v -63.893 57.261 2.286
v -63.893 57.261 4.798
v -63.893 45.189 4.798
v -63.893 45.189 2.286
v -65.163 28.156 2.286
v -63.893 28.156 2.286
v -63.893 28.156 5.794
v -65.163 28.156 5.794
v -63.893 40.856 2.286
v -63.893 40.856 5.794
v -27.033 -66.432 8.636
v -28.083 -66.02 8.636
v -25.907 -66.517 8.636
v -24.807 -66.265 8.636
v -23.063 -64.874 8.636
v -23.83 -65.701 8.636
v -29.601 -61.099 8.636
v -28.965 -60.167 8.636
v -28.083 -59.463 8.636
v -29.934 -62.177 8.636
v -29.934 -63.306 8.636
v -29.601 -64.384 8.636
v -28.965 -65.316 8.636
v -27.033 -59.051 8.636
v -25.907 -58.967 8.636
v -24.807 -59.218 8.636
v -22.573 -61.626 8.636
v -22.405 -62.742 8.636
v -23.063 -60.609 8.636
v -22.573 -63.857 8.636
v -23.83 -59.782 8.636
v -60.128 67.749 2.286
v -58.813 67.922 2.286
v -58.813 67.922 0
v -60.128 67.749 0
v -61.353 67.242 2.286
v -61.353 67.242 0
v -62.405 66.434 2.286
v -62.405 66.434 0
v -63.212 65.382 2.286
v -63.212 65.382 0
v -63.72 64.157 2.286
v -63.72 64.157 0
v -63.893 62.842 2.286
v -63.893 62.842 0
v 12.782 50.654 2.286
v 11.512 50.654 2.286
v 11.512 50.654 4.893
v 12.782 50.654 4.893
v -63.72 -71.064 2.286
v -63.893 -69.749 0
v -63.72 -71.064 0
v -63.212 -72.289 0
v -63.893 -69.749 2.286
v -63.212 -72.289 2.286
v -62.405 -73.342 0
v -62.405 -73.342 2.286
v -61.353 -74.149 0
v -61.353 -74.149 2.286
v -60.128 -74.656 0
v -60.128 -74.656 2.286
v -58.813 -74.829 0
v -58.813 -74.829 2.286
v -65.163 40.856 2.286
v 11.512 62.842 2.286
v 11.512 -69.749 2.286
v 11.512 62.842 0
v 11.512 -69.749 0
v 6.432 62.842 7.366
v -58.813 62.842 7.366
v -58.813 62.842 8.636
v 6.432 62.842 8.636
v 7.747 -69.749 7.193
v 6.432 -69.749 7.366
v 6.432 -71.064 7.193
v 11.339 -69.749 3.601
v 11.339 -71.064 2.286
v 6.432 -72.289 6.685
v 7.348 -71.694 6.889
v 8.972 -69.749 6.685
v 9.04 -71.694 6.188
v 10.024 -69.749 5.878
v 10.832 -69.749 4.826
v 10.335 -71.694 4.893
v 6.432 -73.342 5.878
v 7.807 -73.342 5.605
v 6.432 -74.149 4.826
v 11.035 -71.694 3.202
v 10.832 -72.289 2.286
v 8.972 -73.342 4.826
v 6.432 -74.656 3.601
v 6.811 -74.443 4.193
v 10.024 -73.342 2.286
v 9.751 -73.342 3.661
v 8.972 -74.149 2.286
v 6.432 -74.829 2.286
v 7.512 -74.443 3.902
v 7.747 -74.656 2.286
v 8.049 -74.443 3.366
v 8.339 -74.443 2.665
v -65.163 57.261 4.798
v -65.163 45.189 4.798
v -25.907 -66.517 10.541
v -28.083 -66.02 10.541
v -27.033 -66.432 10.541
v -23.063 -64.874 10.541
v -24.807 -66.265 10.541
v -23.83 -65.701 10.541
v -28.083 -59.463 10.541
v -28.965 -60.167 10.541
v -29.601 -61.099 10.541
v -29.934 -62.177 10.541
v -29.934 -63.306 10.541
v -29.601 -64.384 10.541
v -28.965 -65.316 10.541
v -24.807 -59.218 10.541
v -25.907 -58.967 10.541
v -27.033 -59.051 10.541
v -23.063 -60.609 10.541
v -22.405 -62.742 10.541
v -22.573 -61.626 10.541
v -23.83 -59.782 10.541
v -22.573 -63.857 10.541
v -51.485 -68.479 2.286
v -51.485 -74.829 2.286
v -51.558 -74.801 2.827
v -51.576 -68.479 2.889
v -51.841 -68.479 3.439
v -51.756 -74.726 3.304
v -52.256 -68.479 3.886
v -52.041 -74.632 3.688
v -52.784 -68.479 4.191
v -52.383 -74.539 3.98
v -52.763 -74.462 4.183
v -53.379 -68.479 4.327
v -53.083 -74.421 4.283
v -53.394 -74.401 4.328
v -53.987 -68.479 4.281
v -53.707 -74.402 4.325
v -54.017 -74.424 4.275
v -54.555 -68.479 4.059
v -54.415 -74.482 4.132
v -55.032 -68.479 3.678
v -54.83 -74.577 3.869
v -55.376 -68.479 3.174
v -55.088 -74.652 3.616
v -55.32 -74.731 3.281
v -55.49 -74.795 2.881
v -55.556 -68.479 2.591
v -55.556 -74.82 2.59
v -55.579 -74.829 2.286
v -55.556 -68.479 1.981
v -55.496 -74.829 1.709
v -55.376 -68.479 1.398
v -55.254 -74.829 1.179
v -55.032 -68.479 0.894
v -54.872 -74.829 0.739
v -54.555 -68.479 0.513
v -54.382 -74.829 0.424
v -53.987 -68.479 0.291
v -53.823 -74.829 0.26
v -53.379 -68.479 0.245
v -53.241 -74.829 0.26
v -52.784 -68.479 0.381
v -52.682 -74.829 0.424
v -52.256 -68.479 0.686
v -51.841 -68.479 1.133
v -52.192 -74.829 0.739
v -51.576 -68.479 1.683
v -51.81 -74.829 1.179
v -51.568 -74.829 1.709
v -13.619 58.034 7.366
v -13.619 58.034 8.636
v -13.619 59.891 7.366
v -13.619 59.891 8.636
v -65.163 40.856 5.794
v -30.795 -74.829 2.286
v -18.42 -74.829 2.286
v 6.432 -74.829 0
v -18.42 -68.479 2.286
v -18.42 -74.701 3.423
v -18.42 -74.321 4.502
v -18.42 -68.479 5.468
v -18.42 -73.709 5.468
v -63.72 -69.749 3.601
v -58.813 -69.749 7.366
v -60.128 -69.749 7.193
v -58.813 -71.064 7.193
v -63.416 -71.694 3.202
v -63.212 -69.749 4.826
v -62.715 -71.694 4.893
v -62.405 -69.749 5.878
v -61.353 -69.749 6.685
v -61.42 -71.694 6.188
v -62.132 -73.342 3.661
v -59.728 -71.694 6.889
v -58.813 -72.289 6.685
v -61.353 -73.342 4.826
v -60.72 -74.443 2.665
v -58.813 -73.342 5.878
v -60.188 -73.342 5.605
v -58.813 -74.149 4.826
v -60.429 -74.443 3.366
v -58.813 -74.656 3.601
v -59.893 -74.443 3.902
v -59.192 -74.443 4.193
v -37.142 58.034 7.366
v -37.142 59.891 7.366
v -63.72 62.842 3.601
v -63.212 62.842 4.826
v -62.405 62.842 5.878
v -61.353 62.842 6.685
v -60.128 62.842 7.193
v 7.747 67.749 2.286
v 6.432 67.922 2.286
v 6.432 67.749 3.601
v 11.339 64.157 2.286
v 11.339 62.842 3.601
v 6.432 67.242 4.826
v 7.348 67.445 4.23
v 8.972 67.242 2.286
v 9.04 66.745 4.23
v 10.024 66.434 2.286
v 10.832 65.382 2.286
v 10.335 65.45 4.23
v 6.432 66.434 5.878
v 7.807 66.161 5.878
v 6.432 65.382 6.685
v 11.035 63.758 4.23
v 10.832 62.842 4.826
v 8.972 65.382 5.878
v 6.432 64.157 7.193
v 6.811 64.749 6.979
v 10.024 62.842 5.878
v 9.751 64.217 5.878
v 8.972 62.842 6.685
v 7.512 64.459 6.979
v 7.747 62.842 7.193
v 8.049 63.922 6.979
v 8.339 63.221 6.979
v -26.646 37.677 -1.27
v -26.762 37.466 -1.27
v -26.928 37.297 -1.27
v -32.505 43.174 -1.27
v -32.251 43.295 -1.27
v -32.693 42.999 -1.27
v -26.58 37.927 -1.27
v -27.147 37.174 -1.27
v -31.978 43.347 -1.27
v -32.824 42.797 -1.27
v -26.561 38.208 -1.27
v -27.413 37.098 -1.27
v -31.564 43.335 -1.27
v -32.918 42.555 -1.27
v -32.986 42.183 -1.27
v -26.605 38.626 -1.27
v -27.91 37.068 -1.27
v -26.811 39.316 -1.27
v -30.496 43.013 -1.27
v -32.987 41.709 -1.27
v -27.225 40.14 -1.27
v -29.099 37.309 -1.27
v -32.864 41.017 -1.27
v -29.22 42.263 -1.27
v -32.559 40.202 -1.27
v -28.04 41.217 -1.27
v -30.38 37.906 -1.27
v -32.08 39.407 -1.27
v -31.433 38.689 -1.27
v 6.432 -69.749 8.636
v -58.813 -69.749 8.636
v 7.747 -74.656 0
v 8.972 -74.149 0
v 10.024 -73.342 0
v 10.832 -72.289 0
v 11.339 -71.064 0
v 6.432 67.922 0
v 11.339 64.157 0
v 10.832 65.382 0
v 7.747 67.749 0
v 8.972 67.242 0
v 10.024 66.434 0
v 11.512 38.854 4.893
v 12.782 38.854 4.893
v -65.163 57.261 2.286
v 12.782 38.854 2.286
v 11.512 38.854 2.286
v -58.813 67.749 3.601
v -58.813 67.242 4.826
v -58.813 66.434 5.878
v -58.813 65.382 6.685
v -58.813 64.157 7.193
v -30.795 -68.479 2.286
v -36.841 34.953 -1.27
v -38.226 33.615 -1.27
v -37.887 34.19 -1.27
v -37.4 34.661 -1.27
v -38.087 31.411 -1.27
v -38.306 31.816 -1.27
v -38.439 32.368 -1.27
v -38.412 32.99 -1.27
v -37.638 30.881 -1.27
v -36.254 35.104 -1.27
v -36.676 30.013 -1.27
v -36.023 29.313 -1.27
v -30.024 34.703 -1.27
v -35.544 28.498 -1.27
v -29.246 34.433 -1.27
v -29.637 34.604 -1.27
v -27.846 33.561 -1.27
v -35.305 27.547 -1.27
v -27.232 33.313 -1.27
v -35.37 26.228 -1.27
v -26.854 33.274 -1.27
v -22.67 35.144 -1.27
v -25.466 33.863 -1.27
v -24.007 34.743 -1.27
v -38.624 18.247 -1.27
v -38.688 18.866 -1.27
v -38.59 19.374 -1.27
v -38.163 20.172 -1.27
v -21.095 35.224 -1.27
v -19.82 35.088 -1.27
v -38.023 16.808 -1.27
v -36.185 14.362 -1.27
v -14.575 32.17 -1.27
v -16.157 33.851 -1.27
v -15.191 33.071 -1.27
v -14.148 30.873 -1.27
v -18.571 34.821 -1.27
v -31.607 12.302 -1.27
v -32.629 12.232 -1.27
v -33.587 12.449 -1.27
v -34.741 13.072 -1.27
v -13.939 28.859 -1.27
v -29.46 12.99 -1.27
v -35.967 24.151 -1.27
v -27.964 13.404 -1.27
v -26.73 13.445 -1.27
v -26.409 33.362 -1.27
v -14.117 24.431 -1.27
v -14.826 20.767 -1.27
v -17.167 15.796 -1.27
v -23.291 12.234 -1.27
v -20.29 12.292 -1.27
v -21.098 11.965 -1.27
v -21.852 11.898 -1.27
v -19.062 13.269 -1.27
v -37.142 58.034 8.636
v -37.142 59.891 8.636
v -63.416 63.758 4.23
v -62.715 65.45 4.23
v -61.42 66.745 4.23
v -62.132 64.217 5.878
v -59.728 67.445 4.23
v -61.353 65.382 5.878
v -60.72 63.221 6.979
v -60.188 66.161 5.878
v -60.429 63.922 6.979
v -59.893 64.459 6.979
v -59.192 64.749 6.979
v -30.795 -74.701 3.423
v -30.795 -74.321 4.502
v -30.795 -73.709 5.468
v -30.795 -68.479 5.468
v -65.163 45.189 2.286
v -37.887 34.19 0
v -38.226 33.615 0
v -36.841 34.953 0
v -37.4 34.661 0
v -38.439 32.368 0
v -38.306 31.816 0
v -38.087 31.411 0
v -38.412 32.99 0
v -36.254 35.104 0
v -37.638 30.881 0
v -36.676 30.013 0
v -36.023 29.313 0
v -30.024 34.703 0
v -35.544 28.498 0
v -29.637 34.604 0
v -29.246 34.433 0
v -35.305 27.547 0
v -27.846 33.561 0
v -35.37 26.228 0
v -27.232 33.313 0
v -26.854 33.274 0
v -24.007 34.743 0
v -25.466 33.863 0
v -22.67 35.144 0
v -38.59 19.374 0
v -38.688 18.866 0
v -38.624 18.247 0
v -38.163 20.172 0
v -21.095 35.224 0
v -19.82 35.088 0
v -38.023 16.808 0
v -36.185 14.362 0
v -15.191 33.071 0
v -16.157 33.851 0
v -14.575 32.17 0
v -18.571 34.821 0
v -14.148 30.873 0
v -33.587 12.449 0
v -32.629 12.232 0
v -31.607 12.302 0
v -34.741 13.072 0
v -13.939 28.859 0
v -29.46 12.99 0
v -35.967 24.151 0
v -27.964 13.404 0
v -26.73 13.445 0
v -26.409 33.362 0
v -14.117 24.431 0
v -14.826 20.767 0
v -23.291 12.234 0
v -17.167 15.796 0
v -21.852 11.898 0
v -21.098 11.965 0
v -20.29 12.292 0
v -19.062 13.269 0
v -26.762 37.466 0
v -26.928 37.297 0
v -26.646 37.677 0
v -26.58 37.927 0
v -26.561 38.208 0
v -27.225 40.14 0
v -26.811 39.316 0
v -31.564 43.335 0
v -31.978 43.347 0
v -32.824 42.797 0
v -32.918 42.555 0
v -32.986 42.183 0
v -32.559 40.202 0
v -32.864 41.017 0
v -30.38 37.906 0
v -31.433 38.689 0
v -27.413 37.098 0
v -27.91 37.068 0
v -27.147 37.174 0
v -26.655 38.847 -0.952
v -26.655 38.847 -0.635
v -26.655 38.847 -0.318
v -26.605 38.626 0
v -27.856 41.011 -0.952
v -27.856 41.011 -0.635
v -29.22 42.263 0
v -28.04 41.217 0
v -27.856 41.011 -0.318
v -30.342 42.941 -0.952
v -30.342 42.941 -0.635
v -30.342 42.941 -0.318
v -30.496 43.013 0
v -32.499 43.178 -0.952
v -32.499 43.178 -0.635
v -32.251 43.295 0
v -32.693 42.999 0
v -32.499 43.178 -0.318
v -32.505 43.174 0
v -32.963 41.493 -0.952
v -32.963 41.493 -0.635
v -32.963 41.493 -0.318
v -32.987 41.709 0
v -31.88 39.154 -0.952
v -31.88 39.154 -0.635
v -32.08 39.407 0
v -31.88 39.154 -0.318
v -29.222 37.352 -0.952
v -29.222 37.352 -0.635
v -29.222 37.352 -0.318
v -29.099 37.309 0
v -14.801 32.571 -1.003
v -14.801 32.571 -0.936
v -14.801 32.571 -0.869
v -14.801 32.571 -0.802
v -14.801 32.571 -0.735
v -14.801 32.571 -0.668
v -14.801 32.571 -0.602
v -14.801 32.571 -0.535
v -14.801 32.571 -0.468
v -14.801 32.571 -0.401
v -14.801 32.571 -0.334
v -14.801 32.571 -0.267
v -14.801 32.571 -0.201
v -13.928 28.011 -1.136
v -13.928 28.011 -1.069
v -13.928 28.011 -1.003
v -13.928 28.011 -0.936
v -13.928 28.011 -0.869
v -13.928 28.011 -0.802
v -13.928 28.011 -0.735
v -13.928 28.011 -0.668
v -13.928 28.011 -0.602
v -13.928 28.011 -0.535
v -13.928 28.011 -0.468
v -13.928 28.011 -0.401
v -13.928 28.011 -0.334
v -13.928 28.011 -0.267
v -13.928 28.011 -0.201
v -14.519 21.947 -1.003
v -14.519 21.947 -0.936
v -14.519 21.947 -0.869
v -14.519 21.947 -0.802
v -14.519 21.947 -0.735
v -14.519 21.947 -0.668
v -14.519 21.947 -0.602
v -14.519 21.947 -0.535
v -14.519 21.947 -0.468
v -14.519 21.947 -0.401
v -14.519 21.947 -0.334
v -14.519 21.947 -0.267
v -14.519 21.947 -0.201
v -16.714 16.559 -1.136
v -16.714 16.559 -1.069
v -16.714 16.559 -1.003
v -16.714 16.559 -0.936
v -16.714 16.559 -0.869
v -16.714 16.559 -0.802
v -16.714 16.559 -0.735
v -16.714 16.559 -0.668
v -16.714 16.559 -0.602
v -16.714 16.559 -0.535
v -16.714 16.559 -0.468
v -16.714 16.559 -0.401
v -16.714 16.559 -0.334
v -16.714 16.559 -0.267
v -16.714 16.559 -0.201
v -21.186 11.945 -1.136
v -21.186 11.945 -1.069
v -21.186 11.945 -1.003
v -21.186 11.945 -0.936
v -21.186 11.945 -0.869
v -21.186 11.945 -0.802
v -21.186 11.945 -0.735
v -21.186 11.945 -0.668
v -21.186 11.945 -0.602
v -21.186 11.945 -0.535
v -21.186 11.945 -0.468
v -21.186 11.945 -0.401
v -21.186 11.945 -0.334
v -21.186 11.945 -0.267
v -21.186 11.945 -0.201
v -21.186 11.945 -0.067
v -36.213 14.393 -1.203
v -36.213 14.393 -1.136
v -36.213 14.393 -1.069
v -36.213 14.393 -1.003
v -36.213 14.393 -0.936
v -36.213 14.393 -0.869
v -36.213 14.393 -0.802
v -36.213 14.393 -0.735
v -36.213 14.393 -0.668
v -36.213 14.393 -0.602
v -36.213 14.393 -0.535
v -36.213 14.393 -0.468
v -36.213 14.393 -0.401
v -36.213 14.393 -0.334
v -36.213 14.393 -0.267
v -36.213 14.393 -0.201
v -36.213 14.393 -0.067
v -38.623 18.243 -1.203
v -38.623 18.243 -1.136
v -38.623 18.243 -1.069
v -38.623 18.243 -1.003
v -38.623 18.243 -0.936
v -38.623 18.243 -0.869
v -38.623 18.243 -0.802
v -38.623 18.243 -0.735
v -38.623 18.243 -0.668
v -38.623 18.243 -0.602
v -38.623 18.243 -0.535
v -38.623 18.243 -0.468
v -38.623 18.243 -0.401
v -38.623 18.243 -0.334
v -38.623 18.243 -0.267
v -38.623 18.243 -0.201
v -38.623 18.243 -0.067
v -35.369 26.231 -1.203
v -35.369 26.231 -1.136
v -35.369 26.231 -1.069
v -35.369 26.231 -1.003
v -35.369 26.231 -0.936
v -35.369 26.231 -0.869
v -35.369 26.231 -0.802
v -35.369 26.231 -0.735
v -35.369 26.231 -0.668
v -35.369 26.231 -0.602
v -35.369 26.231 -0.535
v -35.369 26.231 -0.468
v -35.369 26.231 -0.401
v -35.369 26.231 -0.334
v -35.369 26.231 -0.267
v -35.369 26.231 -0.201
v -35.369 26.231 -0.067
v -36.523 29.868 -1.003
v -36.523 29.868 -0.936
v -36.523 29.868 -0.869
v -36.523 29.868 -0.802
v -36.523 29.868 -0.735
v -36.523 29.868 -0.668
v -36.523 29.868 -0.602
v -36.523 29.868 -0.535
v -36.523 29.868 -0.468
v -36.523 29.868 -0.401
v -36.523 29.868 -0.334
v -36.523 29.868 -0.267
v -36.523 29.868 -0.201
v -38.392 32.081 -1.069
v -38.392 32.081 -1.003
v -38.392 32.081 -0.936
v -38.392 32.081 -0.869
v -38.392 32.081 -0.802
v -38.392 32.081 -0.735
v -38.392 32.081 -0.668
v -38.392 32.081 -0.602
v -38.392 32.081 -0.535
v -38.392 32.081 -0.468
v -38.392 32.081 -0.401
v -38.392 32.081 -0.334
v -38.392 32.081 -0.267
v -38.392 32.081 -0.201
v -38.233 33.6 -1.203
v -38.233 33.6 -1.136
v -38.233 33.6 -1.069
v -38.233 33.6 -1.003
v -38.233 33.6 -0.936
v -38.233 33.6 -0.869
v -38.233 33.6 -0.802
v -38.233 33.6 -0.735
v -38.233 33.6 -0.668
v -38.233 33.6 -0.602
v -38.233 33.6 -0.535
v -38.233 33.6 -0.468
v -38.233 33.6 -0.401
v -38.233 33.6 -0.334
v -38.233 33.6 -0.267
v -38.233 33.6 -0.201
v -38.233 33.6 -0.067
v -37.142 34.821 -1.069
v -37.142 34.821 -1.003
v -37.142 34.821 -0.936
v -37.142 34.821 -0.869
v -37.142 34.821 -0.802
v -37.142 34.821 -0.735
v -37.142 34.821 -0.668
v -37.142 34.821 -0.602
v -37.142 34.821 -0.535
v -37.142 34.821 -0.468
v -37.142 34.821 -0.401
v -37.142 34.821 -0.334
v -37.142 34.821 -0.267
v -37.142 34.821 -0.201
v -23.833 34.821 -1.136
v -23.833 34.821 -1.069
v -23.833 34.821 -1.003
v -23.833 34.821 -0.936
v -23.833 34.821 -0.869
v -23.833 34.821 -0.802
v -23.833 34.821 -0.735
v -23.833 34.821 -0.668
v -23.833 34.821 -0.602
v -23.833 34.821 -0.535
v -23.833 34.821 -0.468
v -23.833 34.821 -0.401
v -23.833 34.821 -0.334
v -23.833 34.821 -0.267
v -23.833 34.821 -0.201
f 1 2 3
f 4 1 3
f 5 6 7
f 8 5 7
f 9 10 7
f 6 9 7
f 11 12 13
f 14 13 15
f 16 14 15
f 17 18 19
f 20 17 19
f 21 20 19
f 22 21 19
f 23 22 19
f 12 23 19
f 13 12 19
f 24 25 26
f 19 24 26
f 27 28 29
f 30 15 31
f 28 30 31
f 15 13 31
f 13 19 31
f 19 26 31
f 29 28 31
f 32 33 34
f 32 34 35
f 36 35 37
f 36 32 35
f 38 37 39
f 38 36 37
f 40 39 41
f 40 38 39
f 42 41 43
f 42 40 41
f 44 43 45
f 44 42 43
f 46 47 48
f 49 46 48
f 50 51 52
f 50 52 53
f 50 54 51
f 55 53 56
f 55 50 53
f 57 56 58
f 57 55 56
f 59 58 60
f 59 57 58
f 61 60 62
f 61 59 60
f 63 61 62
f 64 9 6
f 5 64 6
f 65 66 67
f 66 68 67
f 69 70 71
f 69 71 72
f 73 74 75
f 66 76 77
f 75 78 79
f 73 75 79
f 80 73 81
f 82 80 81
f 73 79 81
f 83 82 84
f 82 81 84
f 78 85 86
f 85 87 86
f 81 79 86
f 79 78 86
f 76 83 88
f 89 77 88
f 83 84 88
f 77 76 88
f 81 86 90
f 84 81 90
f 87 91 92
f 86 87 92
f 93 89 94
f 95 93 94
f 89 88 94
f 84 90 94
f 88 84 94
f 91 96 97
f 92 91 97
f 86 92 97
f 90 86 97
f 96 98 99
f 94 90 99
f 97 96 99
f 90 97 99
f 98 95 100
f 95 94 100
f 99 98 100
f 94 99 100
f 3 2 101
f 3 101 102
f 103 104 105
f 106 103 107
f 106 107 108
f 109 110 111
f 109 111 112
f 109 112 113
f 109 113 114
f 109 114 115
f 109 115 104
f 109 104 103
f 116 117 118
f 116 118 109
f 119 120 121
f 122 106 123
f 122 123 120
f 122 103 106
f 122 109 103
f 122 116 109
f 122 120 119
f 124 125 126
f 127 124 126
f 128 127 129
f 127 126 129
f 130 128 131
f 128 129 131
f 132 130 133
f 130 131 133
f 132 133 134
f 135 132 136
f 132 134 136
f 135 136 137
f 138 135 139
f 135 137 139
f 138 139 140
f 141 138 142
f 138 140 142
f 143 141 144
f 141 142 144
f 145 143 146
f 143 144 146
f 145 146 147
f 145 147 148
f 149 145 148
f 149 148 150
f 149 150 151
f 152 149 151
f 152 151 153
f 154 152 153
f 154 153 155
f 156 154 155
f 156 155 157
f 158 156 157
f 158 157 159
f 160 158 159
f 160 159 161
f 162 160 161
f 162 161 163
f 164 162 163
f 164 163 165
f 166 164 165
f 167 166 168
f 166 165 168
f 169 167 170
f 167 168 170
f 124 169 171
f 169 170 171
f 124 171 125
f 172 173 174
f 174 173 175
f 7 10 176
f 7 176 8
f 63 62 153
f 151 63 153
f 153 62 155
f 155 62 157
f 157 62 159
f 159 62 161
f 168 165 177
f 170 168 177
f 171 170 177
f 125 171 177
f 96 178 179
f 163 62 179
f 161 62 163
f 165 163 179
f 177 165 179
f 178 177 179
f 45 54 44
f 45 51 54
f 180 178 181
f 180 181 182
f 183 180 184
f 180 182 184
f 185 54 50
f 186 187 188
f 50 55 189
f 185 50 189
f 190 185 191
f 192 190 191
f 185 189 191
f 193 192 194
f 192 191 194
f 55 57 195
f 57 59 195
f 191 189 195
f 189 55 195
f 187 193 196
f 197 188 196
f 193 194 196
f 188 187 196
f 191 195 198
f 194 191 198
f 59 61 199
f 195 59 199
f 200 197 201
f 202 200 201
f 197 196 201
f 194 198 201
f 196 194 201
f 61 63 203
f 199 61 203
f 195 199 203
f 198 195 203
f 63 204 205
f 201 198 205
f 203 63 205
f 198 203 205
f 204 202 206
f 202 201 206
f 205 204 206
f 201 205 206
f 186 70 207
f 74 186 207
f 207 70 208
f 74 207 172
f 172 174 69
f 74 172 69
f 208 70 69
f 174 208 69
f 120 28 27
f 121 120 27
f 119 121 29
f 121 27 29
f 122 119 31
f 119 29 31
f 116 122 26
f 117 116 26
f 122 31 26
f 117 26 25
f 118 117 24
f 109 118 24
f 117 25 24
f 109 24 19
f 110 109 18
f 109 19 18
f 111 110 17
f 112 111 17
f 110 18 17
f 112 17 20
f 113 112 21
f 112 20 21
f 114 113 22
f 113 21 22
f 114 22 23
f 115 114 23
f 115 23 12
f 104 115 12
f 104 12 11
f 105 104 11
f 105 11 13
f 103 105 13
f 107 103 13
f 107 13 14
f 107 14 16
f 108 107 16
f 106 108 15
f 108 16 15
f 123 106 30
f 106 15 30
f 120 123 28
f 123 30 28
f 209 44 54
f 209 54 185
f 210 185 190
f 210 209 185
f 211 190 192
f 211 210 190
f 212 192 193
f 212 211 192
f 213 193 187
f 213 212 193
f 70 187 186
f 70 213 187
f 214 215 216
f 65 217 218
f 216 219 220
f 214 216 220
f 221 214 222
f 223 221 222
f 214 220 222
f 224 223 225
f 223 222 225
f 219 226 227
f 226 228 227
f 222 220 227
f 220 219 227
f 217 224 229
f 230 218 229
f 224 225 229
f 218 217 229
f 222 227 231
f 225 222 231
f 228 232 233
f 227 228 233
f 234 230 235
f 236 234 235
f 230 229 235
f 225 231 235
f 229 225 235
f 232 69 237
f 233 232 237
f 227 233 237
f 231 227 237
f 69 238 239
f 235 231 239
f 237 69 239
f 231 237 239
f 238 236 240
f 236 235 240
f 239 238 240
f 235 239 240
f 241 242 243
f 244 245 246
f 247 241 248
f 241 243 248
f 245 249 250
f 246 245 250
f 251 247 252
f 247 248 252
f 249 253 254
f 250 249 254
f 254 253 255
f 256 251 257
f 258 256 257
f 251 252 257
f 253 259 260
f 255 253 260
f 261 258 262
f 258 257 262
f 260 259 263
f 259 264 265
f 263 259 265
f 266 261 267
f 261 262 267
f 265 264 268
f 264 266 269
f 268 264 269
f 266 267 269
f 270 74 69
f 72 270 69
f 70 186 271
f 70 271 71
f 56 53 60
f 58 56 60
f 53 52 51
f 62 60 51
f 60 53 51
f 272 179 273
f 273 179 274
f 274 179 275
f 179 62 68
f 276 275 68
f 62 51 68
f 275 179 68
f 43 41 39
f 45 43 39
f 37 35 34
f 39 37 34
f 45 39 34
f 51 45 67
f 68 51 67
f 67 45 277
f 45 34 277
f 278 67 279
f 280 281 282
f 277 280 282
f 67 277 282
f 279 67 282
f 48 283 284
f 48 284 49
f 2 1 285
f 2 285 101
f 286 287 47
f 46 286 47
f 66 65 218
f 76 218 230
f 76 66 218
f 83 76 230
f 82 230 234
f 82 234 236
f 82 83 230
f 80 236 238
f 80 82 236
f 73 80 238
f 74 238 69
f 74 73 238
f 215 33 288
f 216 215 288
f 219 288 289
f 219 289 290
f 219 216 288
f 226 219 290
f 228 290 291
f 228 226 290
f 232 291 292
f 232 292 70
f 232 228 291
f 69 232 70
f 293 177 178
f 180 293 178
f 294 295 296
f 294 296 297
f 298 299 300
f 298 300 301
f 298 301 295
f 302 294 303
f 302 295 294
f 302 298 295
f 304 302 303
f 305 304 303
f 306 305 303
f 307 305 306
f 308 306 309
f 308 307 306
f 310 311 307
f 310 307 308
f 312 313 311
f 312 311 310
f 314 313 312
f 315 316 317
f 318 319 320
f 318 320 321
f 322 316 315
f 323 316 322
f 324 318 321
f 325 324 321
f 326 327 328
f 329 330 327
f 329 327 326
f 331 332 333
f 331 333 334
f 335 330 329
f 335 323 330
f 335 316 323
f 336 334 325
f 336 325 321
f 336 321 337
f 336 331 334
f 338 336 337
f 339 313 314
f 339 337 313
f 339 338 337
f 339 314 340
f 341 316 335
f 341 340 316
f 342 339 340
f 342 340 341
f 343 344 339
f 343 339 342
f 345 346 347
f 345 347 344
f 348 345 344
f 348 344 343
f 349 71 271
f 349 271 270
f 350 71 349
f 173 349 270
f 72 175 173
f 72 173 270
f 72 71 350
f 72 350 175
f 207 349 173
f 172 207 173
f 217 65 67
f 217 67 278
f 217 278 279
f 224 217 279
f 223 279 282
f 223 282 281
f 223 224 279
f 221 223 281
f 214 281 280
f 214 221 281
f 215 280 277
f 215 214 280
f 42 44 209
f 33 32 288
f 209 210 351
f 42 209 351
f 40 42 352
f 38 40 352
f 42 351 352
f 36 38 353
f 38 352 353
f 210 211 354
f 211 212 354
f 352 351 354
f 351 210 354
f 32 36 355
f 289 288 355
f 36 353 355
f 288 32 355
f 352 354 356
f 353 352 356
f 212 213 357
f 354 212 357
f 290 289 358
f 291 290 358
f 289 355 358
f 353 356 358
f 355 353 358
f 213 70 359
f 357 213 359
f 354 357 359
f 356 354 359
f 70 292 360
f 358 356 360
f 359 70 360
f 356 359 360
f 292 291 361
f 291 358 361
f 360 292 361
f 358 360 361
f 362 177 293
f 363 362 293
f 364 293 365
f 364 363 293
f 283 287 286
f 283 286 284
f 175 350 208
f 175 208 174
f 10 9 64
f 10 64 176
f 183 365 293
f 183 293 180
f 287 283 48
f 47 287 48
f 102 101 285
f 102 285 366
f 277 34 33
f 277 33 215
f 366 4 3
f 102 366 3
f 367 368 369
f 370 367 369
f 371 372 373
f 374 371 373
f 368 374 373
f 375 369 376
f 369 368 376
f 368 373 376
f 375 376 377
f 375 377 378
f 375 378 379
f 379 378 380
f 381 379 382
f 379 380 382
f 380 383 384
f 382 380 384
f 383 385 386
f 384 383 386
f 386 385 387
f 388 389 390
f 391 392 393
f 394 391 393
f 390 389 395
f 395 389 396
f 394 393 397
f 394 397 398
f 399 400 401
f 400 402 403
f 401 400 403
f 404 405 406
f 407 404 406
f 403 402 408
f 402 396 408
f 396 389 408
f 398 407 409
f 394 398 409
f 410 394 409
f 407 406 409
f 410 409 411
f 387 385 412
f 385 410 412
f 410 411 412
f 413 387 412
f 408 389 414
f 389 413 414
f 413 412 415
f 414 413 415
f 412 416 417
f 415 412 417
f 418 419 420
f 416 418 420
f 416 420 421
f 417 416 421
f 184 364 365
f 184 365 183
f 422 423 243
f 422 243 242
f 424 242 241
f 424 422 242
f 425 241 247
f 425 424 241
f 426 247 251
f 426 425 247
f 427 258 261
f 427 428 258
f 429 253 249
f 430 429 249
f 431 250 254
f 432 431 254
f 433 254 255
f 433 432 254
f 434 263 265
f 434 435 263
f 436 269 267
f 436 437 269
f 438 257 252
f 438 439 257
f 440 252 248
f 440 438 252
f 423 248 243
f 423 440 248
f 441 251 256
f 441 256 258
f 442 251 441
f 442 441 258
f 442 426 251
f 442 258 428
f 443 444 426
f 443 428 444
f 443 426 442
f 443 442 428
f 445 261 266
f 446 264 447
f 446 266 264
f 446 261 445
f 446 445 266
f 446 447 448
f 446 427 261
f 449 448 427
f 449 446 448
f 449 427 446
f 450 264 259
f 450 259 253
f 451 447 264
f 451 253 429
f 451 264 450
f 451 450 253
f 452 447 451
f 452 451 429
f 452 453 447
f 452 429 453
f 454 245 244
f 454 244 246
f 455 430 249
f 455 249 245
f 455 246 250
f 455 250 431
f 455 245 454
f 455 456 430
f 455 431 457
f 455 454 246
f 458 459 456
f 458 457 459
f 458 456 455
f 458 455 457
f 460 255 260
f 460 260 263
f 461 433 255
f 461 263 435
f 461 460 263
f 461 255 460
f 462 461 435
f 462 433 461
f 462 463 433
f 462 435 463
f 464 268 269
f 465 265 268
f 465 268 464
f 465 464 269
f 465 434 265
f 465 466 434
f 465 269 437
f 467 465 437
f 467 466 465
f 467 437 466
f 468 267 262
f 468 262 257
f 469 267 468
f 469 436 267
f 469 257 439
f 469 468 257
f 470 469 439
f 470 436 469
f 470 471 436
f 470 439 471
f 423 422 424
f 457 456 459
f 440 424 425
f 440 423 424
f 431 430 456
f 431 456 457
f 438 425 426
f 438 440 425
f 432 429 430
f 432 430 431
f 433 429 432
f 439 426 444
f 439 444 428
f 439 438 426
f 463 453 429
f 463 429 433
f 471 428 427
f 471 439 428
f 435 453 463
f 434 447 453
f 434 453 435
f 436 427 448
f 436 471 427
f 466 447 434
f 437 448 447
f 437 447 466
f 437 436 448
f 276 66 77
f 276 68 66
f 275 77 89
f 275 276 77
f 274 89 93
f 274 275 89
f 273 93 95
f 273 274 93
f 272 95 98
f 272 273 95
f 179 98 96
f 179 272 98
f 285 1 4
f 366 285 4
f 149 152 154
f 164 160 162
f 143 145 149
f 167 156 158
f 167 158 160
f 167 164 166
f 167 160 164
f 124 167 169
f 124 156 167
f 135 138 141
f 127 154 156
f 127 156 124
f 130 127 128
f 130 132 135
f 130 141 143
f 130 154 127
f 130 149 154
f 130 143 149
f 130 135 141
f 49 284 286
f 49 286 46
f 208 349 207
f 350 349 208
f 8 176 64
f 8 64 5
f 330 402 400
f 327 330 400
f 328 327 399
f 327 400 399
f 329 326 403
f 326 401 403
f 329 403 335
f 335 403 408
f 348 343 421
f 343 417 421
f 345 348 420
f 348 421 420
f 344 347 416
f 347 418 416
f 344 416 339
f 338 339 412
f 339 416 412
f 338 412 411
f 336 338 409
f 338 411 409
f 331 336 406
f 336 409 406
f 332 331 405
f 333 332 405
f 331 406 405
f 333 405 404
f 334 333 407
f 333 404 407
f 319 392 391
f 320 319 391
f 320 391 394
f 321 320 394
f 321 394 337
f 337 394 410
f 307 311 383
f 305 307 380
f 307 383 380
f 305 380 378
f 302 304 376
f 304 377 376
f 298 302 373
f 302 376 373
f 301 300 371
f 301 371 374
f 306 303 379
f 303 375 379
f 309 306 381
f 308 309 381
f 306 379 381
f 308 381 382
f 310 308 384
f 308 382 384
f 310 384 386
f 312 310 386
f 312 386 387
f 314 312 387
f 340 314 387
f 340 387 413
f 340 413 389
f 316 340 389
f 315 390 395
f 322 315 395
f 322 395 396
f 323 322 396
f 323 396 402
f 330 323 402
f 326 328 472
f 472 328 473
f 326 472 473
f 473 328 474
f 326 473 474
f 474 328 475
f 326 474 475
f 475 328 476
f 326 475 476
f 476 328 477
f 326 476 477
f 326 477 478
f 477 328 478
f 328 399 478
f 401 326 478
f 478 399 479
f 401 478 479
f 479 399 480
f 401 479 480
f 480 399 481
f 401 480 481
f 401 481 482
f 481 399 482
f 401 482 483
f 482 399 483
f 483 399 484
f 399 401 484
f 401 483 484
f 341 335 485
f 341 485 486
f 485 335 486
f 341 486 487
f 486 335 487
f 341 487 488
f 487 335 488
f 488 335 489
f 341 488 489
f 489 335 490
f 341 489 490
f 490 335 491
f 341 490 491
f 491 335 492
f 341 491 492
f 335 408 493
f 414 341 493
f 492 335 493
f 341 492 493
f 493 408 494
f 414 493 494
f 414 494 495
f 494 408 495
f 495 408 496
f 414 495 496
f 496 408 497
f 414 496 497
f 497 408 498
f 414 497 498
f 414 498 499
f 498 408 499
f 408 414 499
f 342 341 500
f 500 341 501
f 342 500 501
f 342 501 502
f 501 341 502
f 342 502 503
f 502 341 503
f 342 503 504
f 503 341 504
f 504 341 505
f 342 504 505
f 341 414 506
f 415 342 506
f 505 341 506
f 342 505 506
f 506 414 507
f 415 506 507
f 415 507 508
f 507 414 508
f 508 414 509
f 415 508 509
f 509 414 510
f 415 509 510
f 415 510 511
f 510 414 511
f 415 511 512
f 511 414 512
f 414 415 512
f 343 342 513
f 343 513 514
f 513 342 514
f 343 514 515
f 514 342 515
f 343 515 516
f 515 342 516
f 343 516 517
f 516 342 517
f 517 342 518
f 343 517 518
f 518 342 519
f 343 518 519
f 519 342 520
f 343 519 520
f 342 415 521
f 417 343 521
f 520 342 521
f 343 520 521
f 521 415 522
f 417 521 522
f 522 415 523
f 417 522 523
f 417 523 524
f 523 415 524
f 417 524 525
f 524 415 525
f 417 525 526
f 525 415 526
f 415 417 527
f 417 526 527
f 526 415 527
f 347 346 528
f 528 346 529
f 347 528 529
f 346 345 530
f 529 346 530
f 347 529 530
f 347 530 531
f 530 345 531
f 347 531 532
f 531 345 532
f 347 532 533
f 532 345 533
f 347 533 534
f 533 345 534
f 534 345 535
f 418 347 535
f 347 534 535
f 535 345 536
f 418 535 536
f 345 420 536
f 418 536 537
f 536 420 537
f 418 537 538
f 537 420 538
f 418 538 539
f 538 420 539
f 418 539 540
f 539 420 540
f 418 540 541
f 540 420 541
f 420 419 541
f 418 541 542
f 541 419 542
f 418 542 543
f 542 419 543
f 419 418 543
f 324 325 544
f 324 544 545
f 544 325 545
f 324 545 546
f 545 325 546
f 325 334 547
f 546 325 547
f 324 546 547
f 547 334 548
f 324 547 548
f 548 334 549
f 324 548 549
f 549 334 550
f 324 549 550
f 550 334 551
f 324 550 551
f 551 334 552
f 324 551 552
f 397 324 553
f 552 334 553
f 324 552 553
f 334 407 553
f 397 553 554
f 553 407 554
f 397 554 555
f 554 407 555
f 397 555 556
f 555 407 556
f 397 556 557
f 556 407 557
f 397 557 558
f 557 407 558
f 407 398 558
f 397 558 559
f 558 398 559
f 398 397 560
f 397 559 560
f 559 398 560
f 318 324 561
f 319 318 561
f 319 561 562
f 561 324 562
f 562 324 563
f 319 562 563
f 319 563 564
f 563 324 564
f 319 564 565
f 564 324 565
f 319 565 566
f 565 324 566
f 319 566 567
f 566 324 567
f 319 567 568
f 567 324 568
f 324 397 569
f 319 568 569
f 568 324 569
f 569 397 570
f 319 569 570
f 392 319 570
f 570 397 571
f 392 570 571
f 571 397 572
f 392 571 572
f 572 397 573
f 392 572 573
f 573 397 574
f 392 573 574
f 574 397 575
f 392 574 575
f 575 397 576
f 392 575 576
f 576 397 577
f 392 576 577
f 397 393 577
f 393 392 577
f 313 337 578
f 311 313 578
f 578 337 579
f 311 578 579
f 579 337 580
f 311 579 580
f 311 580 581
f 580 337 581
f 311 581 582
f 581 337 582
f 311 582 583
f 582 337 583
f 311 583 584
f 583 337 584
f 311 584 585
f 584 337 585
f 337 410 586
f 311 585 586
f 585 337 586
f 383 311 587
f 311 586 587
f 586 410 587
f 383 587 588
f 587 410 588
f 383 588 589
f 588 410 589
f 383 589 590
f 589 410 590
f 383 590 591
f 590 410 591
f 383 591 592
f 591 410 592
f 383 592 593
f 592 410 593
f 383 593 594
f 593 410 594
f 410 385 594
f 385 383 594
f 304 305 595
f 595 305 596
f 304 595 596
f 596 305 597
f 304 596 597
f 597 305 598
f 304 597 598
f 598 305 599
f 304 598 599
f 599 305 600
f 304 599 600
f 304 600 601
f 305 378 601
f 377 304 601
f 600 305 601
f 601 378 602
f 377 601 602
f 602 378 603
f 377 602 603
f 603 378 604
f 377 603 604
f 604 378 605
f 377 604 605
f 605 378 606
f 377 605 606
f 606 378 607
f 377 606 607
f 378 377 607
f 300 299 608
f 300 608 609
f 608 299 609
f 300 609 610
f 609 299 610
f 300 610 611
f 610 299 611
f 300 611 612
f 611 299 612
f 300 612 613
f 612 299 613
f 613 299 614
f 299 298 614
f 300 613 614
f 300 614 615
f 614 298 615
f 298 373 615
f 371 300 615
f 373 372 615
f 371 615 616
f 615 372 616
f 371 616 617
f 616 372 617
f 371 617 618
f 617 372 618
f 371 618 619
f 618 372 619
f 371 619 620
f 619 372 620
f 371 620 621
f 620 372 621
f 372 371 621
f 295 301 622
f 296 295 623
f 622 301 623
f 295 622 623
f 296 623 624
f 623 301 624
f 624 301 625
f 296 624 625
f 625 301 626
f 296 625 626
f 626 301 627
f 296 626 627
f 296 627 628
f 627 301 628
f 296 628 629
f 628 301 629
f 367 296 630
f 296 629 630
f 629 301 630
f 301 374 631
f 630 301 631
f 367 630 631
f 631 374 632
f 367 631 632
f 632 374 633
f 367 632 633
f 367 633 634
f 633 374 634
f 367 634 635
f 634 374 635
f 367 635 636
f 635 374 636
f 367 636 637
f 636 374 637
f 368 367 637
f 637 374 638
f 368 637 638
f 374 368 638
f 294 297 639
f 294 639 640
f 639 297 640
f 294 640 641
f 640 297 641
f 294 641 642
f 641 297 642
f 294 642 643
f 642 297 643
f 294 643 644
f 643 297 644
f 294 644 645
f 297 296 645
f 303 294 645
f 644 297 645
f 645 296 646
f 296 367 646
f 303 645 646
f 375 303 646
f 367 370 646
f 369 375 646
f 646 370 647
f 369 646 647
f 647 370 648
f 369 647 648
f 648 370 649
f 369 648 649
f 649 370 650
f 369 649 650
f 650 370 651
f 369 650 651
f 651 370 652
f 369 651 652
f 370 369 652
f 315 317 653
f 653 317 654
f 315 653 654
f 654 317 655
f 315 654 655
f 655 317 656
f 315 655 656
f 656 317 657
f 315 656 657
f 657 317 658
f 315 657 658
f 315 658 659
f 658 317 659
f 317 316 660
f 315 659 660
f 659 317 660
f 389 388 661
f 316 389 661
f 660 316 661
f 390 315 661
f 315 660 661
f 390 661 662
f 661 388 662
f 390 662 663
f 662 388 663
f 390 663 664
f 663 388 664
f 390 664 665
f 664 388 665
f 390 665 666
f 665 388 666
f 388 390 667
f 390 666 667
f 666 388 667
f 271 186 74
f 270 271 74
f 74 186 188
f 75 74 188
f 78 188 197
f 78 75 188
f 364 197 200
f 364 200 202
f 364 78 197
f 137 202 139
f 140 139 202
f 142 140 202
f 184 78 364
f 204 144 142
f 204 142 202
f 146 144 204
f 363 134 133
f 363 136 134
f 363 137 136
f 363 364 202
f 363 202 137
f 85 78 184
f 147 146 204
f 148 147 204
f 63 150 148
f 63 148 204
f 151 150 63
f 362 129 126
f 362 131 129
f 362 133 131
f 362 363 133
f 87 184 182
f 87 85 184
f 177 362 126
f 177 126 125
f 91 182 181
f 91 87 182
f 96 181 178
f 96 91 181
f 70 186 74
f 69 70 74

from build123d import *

# Parameters (mm, degrees)
F0_W      = 75.4051078111
F0_H      = 142.7516564727
F1_DEPTH  = 7.366
F2_F1_R   = 5.08
F2_F2_R   = 5.08
F2_F3_R   = 5.08
F2_F4_R   = 5.08
F3_W      = 12.3756472021
F3_H      = 3.1823093913
F4_DEPTH  = 6.35
F5_R      = 2.046755254
F6_DEPTH  = 6.35
F7_W      = 65.2451078111
F7_H      = 132.5916564727
F8_DEPTH  = 1.27
F9_W      = 11.800032109
F9_H      = 2.6066980235
F10_DEPTH = 1.27
F11_R     = 3.7854916829
F12_DEPTH = 1.905
F13_W     = 23.5232524574
F13_H     = 1.857098192
F14_DEPTH = 6.35
F15_W     = 12.0711438358
F15_H     = 2.5115047491
F16_DEPTH = 1.27
F17_W     = 12.7
F17_H     = 3.5076188103
F18_DEPTH = 1.27
F20_DEPTH = 1.27


with BuildPart() as f1:
    # F0 (on Top) → F1 (new body)
    with BuildSketch(Plane.XY):
        with Locations((-26.1903246865, -3.4536682069)):
            Rectangle(F0_W, F0_H)
    extrude(amount=F1_DEPTH)

    # F2: fillet of radius 5.08 on 8 edges, made by hand

    # F2_f1
    f2_f1_edges = [f1.edges().sort_by_distance(p)[0] for p in [
        (11.5122292191, 67.9221600294, 3.683),
    ]]
    fillet(f2_f1_edges, radius=F2_F1_R)

    # F2_f2
    f2_f2_edges = [f1.edges().sort_by_distance(p)[0] for p in [
        (-63.892878592, 67.9221600294, 3.683),
    ]]
    fillet(f2_f2_edges, radius=F2_F2_R)

    # F2_f3
    f2_f3_edges = [f1.edges().sort_by_distance(p)[0] for p in [
        (-26.1903246865, 67.9221600294, 7.366),
    ]]
    fillet(f2_f3_edges, radius=F2_F3_R)

    # F2_f4
    f2_f4_edges = [f1.edges().sort_by_distance(p)[0] for p in [
        (-63.892878592, -74.8294964433, 1.143),
    ]]
    fillet(f2_f4_edges, radius=F2_F4_R)

    # F3 (on face) → F4 (cut)
    with BuildSketch(Plane.XZ.offset(74.8294964433)):
        with Locations((-24.6073929593, 3.8771546956)):
            Rectangle(F3_W, F3_H)
    extrude(amount=-F4_DEPTH, mode=Mode.SUBTRACT)

    # F5 (on face) → F6 (cut)
    with BuildSketch(Plane.XZ.offset(74.8294964433)):
        with Locations((-53.5318702459, 2.286)):
            Circle(F5_R)
    extrude(amount=-F6_DEPTH, mode=Mode.SUBTRACT)


with BuildPart() as f8:
    # F7 (on face) → F8 (new body)
    with BuildSketch(Plane.XY.offset(7.366)):
        with Locations((-26.1903246865, -3.4536682069)):
            Rectangle(F7_W, F7_H)
    extrude(amount=F8_DEPTH)

    # F13 (on face) → F14 (cut)
    with BuildSketch(Plane.XY.offset(8.636)):
        with Locations((-25.3803487867, 58.9628834277)):
            Rectangle(F13_W, F13_H)
    extrude(amount=-F14_DEPTH, mode=Mode.SUBTRACT)


with BuildPart() as f10:
    # F9 (on face) → F10 (new body)
    with BuildSketch(Plane.YZ.offset(11.5122292191)):
        with Locations((44.7537954897, 3.5893490117)):
            Rectangle(F9_W, F9_H)
    extrude(amount=F10_DEPTH)


with BuildPart() as f12:
    # F11 (on face) → F12 (new body)
    with BuildSketch(Plane.XY.offset(8.636)):
        with Locations((-26.1903246865, -62.7416521311)):
            Circle(F11_R)
    extrude(amount=F12_DEPTH)


with BuildPart() as f16:
    # F15 (on face) → F16 (new body)
    with BuildSketch(Plane(origin=(-63.892878592, 0, 0), x_dir=(0, -1, 0), z_dir=(-1, 0, 0))):
        with Locations((-51.2249711901, 3.5417523746)):
            Rectangle(F15_W, F15_H)
    extrude(amount=F16_DEPTH)


with BuildPart() as f18:
    # F17 (on face) → F18 (new body)
    with BuildSketch(Plane(origin=(-63.892878592, 0, 0), x_dir=(0, -1, 0), z_dir=(-1, 0, 0))):
        with Locations((-34.5061713994, 4.0398094052)):
            Rectangle(F17_W, F17_H)
    extrude(amount=F18_DEPTH)


with BuildPart() as f20:
    # F19 (on face) → F20 (new body)
    with BuildSketch(Plane(origin=(0, 0, 0), x_dir=(1, 0, 0), z_dir=(0, 0, -1))):
        with BuildLine():
            add(Edge.make_bspline(
                [(-26.9279293716, -37.296731025), (-26.1590478095, -37.8796180067), (-27.2405076799, -41.610190349), (-33.6150642057, -44.8689171286), (-32.8227501646, -38.2996334195), (-27.8316461583, -36.6116258331), (-26.9279293716, -37.296731025)],
                knots=[0, 0, 0, 0, 0.2291805231, 0.4943005153, 0.7306291422, 1, 1, 1, 1], degree=3))
        make_face()
    extrude(amount=F20_DEPTH)


with BuildPart() as f20b:
    # F19 (on face) → F20, piece 2 (new body)
    with BuildSketch(Plane(origin=(0, 0, 0), x_dir=(1, 0, 0), z_dir=(0, 0, -1))):
        with BuildLine():
            add(Edge.make_bspline(
                [(-18.5709875077, -34.8206013441), (-16.9933307569, -34.4069620178), (-14.1792039609, -33.0899210778), (-13.7777924329, -27.883110785), (-14.272988719, -21.6169154673), (-16.351813669, -16.762216435), (-21.0363385209, -9.9297464764), (-26.8947206756, -14.9211673759), (-32.2389811264, -11.130286541), (-36.3725185757, -14.0623640639), (-39.5224923345, -18.8545713408), (-37.2114139136, -21.0298104682), (-34.5153706863, -27.1103805858), (-36.2968935413, -29.969179565), (-39.0716980584, -31.7151857926), (-37.5791604466, -35.9829722305), (-31.7963960221, -34.5523022934), (-29.4355823464, -34.9774247098), (-26.8124785552, -32.318446701), (-23.9298221224, -35.599274808), (-20.3161966458, -35.2781705408), (-18.5709875077, -34.8206013441)],
                knots=[0, 0, 0, 0, 0.0520581477, 0.10668462, 0.1693019503, 0.2291883895, 0.2935167278, 0.3538845551, 0.4122524688, 0.4659202448, 0.522004706, 0.5637754073, 0.6266239453, 0.6704560449, 0.7128646393, 0.7566967388, 0.814283655, 0.8539413629, 0.8957120516, 0.9424131041, 1, 1, 1, 1], degree=3))
        make_face()
    extrude(amount=F20_DEPTH)


solid = Compound([f1.part, f8.part, f10.part, f12.part, f16.part, f18.part, f20.part, f20b.part])
